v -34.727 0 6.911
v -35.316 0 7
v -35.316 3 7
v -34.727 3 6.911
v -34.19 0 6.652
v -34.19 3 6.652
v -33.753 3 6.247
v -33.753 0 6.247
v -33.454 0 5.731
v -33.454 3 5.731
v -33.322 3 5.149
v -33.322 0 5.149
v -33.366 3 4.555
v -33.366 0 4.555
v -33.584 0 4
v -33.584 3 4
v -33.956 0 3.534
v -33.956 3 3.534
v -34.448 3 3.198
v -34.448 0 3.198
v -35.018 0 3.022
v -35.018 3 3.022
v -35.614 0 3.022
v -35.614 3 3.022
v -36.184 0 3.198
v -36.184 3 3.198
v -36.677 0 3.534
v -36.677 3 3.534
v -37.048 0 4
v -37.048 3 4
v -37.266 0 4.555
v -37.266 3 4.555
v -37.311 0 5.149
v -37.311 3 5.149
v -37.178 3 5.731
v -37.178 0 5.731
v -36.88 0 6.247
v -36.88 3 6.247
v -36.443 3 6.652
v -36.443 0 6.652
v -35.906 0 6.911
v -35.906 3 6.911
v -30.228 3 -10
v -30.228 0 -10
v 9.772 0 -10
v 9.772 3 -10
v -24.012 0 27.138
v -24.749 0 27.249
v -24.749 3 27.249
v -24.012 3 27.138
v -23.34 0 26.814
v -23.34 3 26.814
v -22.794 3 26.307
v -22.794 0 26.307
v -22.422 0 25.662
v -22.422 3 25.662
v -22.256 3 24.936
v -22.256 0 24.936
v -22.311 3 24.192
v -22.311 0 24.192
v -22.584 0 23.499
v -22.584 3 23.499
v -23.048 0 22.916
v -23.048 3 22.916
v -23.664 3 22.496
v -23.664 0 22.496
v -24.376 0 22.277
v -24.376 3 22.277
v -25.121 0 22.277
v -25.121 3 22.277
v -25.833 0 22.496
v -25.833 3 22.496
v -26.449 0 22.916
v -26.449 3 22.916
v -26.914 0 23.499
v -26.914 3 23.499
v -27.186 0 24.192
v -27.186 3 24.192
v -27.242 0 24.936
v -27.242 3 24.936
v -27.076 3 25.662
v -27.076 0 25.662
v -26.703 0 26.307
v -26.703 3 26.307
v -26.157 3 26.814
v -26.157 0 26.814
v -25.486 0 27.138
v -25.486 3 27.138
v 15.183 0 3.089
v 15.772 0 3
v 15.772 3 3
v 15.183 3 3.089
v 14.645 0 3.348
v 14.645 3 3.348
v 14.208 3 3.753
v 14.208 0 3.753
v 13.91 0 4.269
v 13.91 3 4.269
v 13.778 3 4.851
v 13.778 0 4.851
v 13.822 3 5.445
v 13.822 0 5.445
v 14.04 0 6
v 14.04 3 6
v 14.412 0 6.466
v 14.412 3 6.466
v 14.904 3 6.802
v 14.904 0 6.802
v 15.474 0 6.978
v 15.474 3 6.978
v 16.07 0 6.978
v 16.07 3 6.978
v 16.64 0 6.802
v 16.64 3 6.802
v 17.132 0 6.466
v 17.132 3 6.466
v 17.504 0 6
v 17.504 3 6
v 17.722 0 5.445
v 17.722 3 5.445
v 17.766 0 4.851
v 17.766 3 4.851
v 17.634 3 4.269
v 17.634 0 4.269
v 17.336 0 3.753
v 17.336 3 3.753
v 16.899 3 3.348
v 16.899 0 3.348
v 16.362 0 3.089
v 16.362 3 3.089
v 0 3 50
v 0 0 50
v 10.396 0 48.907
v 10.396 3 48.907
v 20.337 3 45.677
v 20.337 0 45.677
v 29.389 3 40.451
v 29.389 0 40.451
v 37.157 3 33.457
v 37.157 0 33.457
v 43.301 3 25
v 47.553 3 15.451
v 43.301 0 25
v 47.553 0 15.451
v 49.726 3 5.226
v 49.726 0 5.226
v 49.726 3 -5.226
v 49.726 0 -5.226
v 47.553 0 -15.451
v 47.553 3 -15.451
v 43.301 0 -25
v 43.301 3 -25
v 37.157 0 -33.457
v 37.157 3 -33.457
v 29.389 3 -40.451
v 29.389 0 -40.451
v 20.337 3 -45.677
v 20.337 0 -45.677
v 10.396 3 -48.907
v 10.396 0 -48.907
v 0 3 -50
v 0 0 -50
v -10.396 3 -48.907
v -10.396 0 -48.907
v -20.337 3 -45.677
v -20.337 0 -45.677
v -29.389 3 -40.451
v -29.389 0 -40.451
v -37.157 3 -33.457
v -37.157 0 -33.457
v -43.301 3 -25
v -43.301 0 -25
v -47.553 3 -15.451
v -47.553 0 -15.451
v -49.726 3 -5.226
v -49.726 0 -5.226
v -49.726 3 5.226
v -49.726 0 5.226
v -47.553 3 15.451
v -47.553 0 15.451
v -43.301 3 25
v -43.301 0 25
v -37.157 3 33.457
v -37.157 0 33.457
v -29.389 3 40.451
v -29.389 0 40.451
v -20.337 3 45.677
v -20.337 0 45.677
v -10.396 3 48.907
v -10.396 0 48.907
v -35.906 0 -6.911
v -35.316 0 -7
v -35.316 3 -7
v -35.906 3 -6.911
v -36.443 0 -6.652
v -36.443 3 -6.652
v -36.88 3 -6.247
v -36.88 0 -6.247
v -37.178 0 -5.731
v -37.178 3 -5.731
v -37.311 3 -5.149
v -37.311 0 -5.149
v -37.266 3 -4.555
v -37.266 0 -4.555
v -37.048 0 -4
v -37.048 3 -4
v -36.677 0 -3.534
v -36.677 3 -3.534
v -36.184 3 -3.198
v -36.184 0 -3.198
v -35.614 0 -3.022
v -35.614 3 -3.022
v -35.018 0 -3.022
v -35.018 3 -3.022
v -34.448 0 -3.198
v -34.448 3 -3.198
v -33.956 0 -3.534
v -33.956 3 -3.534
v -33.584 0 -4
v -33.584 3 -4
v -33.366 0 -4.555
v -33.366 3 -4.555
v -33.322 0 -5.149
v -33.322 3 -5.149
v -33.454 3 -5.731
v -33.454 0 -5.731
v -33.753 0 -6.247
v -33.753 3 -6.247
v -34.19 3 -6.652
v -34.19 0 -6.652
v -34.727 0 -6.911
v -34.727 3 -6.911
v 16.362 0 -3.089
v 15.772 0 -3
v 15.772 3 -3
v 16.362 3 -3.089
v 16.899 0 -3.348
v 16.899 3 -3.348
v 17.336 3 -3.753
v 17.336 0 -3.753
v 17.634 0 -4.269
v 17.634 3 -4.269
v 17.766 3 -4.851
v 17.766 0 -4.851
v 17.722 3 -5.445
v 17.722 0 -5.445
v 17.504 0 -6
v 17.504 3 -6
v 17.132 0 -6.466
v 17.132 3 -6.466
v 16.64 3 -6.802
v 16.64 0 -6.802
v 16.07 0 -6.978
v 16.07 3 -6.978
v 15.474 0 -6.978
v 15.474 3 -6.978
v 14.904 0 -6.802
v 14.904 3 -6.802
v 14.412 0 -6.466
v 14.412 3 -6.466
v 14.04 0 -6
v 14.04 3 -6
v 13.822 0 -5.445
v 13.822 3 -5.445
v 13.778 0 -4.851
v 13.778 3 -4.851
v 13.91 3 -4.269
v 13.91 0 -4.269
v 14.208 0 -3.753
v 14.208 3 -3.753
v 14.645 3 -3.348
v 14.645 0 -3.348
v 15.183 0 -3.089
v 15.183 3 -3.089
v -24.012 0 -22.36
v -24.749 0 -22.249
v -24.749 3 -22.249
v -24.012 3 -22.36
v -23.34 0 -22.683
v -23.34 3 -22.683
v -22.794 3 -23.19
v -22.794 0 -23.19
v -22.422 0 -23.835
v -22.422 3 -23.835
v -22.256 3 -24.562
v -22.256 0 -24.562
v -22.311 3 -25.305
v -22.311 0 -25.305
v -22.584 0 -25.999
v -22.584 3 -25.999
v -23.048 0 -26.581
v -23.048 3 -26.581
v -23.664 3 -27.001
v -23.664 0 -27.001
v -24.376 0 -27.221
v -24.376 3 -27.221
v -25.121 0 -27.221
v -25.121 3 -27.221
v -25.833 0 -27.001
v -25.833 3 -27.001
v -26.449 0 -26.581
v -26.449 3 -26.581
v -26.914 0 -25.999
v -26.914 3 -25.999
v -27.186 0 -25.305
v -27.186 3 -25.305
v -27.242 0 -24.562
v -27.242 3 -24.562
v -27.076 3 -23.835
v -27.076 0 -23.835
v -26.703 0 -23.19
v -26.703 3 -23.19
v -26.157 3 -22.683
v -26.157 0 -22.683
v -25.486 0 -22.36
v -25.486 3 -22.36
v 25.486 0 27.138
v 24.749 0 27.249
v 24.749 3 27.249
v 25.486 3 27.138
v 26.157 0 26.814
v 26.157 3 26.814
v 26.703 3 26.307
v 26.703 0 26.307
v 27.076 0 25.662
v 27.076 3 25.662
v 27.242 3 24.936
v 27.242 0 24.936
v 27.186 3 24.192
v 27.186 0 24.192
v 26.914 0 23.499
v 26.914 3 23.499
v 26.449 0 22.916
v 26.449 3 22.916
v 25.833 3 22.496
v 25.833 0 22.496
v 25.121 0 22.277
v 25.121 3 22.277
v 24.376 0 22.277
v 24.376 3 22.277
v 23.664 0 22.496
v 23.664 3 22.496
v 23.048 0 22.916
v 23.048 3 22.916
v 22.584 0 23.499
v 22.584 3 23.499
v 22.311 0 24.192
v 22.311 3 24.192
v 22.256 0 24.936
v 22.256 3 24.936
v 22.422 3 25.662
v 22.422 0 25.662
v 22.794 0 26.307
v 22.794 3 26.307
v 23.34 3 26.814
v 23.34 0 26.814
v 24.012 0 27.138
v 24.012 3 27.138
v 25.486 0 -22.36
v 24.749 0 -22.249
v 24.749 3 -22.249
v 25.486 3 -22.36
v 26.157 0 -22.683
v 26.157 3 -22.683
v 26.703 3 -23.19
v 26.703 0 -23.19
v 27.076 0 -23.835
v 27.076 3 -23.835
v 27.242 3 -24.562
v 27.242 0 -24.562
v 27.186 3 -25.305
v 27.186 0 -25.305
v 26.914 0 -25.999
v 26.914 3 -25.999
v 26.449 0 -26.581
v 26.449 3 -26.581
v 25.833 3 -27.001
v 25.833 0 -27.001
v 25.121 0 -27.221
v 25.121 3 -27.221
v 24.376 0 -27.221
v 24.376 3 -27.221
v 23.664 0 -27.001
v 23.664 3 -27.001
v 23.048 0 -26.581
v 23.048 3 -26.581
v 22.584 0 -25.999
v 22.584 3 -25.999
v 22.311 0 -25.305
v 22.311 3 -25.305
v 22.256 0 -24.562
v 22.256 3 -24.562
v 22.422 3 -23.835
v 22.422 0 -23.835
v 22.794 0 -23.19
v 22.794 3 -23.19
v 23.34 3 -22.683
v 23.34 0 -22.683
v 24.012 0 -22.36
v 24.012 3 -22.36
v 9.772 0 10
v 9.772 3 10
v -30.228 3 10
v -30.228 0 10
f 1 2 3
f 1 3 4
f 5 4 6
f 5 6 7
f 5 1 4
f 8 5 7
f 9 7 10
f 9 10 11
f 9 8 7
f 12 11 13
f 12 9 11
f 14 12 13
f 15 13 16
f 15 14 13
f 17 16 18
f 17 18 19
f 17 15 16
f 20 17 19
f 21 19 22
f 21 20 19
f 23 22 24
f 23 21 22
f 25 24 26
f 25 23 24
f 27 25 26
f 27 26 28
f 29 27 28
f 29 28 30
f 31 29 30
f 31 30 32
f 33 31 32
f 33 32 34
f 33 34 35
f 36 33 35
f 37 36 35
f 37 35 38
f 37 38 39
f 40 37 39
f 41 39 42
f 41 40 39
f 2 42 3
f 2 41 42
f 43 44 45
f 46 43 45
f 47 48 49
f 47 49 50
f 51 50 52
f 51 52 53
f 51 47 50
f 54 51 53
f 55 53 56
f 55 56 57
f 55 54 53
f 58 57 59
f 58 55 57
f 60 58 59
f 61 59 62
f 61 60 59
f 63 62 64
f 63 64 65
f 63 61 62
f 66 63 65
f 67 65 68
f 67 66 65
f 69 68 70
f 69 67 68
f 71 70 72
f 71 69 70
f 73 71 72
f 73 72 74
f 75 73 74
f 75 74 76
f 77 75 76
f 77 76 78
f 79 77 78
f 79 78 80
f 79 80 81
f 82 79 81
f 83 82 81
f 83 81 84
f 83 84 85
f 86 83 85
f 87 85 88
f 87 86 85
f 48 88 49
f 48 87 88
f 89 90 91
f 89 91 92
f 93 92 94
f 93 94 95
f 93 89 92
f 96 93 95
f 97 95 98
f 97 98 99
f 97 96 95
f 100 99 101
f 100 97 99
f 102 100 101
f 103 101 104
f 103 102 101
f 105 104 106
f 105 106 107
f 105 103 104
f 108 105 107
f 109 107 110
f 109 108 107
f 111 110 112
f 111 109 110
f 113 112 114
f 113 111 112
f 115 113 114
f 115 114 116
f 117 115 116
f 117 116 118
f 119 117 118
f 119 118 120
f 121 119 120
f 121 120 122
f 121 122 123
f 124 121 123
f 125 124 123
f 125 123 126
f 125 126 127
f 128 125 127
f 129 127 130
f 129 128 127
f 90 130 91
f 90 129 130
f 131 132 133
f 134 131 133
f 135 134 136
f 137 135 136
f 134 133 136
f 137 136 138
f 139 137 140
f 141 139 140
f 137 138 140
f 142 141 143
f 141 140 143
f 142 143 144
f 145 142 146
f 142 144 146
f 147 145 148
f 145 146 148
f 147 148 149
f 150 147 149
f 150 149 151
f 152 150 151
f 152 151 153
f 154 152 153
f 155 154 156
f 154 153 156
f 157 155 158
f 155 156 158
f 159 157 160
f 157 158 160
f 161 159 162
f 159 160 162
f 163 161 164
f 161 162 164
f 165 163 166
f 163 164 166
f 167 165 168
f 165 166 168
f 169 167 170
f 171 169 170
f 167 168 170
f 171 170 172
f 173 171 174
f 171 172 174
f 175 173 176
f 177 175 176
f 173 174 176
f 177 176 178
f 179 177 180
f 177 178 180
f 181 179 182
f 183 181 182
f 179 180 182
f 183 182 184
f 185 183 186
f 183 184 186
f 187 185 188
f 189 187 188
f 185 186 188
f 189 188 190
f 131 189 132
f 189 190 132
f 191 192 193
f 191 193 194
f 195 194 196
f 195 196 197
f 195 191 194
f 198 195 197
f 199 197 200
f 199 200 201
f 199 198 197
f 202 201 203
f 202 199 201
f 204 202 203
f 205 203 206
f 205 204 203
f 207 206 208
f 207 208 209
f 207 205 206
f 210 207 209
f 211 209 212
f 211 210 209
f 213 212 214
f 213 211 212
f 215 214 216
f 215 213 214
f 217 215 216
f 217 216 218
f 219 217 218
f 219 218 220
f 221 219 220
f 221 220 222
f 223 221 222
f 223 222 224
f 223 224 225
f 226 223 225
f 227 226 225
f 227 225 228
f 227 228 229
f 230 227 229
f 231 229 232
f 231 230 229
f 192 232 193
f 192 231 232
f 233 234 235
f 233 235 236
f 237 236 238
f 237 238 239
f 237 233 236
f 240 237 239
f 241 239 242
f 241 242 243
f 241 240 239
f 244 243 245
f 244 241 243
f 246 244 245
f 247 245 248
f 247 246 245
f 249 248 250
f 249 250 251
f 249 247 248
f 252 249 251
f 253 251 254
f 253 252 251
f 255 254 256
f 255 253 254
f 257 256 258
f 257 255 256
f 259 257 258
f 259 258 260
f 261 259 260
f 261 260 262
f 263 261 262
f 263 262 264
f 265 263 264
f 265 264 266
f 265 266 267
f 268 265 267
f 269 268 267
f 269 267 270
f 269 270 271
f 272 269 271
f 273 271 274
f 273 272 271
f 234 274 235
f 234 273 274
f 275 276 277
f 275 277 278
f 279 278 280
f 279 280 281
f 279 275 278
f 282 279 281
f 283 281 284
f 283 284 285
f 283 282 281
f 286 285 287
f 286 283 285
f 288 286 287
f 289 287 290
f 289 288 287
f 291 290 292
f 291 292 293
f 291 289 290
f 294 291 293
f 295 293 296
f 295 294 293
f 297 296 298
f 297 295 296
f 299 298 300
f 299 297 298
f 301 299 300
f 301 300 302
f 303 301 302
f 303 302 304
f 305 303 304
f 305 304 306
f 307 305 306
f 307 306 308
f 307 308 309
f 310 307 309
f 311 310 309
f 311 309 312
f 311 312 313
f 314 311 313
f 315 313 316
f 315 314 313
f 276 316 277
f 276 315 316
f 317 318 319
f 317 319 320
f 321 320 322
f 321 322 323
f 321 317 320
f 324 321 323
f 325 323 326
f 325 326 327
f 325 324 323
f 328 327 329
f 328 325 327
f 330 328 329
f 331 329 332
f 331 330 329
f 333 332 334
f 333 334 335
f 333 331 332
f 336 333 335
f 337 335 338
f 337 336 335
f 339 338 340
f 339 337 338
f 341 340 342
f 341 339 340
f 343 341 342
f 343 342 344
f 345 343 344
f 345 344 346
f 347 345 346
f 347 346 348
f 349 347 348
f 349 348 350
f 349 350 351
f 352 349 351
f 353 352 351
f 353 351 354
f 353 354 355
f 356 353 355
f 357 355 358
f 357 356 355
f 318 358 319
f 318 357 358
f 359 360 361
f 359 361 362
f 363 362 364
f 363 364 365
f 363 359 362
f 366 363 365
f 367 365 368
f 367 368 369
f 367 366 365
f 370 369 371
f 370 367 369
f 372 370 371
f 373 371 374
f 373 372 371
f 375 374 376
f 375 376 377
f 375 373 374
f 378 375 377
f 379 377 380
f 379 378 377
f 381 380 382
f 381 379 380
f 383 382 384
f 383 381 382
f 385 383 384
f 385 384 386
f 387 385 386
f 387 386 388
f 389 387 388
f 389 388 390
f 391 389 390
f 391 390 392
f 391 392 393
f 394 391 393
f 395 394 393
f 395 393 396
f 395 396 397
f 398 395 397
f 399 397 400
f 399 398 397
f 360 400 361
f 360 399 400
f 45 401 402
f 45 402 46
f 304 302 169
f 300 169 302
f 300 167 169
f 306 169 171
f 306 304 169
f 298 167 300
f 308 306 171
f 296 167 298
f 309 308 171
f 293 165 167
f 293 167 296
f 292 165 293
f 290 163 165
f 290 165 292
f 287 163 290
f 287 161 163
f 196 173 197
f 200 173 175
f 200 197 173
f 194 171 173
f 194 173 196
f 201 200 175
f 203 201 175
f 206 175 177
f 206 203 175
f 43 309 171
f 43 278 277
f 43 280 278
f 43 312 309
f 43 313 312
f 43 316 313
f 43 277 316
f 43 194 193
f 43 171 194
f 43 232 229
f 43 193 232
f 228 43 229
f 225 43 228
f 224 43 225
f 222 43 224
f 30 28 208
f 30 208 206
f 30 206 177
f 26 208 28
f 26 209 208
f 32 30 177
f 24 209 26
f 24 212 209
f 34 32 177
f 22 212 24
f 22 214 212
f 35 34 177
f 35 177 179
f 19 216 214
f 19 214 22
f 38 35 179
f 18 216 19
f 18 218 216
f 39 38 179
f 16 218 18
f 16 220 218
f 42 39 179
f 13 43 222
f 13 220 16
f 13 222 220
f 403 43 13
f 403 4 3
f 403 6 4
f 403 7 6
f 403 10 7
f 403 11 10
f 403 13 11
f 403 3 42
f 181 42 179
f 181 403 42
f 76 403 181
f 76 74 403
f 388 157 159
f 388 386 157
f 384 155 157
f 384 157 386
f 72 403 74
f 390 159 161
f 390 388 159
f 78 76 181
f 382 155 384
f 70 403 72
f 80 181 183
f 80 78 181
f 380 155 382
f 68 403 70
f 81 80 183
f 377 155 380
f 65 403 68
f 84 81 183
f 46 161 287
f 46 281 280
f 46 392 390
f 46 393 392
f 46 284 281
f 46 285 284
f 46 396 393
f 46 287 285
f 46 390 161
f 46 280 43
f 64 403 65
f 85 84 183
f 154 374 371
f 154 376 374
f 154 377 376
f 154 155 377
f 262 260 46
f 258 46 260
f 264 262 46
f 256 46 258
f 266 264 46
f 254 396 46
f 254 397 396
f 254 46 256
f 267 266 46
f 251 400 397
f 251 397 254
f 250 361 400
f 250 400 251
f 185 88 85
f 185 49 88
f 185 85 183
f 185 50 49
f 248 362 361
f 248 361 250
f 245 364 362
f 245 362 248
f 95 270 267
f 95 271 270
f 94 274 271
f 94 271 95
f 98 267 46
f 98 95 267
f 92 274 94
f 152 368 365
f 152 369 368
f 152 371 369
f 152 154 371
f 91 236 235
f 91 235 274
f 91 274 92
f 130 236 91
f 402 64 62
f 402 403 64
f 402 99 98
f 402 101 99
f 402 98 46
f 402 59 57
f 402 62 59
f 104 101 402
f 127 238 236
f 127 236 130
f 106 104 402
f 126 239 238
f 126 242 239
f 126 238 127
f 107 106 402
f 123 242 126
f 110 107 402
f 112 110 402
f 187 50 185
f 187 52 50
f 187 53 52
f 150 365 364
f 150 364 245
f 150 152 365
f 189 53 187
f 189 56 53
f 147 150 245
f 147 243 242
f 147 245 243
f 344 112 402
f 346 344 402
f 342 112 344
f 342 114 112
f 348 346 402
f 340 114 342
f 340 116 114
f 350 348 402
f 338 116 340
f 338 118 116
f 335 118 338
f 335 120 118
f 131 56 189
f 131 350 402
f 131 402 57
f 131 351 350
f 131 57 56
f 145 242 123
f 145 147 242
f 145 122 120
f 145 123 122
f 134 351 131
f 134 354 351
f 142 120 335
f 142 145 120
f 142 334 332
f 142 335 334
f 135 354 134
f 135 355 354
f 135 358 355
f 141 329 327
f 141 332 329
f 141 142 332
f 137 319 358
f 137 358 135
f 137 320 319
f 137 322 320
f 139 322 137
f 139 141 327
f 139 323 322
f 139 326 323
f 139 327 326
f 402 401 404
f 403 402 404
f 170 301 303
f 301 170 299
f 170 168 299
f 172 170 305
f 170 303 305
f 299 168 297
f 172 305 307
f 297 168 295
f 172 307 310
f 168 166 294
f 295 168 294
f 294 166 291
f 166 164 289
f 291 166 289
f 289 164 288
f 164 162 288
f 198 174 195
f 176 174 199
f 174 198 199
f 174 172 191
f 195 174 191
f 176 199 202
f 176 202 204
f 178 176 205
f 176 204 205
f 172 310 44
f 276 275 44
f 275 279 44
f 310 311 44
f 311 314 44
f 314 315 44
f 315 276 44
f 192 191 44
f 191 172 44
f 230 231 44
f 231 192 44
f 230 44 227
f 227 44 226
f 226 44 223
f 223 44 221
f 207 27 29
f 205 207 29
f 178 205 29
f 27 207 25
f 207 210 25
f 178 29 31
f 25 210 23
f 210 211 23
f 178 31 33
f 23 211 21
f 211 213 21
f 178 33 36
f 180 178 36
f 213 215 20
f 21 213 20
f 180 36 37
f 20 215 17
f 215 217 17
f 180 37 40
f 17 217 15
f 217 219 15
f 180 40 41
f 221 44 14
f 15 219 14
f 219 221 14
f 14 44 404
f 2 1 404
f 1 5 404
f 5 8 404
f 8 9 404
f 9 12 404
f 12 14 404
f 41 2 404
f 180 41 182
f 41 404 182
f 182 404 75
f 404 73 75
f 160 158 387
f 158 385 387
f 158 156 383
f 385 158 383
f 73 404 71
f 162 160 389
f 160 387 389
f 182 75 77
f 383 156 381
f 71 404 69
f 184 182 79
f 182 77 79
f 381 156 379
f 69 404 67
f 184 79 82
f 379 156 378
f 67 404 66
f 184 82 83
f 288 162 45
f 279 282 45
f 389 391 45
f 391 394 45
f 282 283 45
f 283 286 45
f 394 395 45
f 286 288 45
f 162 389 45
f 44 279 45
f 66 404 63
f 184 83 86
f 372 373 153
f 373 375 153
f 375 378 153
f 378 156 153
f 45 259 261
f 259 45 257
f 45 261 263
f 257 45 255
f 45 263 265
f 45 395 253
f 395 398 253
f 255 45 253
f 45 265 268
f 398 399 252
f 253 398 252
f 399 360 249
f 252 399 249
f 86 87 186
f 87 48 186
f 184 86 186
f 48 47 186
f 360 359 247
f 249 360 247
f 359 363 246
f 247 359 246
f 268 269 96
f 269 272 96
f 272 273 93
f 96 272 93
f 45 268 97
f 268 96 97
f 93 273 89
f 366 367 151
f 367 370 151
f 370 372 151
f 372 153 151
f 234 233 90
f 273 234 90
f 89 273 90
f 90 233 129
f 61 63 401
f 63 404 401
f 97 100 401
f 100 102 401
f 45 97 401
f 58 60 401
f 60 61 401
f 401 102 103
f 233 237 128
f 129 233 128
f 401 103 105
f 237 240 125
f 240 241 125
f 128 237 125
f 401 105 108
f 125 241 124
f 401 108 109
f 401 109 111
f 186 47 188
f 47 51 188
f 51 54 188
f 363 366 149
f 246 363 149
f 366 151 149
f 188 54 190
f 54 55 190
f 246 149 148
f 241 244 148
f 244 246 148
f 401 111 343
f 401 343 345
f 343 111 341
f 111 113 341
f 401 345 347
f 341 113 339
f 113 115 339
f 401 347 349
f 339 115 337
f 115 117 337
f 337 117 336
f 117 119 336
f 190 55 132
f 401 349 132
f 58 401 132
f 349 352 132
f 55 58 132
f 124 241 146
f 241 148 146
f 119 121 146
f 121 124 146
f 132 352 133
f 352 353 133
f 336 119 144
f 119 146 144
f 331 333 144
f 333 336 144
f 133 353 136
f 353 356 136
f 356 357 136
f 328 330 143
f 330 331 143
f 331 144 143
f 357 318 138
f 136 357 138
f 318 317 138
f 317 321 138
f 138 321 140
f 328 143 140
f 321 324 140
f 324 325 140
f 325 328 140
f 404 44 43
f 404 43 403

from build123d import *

# Parameters (mm, degrees)
SKETCH2_R           = 50
SKETCH2_R_2         = 2.5
SKETCH2_R_3         = 2
BOSS_EXTRUDE1_DEPTH = 3


with BuildPart() as part:
    # Sketch2 → Boss-Extrude1 (new body)
    with BuildSketch(Plane(origin=(0, 0, 0), x_dir=(1, 0, 0), z_dir=(0, 1, 0))):
        with Locations(Location((0, 0, 0), (0, 0, 270))):
            Circle(SKETCH2_R)
        with Locations(Location((-24.748737342, 24.748737342, 0), (0, 0, 270))):
            Circle(SKETCH2_R_2, mode=Mode.SUBTRACT)
        with Locations(Location((24.748737342, 24.748737342, 0), (0, 0, 270))):
            Circle(SKETCH2_R_2, mode=Mode.SUBTRACT)
        with Locations(Location((24.748737342, -24.748737342, 0), (0, 0, 270))):
            Circle(SKETCH2_R_2, mode=Mode.SUBTRACT)
        with Locations(Location((-24.748737342, -24.748737342, 0), (0, 0, 270))):
            Circle(SKETCH2_R_2, mode=Mode.SUBTRACT)
        with Locations(Location((15.772078615, 5, 0), (0, 0, 270))):
            Circle(SKETCH2_R_3, mode=Mode.SUBTRACT)
        with Locations(Location((15.772078615, -5, 0), (0, 0, 90))):
            Circle(SKETCH2_R_3, mode=Mode.SUBTRACT)
        with Locations(Location((-35.316235845, -5, 0), (0, 0, 270))):
            Circle(SKETCH2_R_3, mode=Mode.SUBTRACT)
        with Locations(Location((-35.316235845, 5, 0), (0, 0, 90))):
            Circle(SKETCH2_R_3, mode=Mode.SUBTRACT)
        Polygon((-9.772078615, -10), (9.772078615, -10), (9.772078615, 10), (-9.772078615, 10), (-30.227921385, 10), (-30.227921385, -10), align=None, mode=Mode.SUBTRACT)
    extrude(amount=BOSS_EXTRUDE1_DEPTH)


solid = part.part
